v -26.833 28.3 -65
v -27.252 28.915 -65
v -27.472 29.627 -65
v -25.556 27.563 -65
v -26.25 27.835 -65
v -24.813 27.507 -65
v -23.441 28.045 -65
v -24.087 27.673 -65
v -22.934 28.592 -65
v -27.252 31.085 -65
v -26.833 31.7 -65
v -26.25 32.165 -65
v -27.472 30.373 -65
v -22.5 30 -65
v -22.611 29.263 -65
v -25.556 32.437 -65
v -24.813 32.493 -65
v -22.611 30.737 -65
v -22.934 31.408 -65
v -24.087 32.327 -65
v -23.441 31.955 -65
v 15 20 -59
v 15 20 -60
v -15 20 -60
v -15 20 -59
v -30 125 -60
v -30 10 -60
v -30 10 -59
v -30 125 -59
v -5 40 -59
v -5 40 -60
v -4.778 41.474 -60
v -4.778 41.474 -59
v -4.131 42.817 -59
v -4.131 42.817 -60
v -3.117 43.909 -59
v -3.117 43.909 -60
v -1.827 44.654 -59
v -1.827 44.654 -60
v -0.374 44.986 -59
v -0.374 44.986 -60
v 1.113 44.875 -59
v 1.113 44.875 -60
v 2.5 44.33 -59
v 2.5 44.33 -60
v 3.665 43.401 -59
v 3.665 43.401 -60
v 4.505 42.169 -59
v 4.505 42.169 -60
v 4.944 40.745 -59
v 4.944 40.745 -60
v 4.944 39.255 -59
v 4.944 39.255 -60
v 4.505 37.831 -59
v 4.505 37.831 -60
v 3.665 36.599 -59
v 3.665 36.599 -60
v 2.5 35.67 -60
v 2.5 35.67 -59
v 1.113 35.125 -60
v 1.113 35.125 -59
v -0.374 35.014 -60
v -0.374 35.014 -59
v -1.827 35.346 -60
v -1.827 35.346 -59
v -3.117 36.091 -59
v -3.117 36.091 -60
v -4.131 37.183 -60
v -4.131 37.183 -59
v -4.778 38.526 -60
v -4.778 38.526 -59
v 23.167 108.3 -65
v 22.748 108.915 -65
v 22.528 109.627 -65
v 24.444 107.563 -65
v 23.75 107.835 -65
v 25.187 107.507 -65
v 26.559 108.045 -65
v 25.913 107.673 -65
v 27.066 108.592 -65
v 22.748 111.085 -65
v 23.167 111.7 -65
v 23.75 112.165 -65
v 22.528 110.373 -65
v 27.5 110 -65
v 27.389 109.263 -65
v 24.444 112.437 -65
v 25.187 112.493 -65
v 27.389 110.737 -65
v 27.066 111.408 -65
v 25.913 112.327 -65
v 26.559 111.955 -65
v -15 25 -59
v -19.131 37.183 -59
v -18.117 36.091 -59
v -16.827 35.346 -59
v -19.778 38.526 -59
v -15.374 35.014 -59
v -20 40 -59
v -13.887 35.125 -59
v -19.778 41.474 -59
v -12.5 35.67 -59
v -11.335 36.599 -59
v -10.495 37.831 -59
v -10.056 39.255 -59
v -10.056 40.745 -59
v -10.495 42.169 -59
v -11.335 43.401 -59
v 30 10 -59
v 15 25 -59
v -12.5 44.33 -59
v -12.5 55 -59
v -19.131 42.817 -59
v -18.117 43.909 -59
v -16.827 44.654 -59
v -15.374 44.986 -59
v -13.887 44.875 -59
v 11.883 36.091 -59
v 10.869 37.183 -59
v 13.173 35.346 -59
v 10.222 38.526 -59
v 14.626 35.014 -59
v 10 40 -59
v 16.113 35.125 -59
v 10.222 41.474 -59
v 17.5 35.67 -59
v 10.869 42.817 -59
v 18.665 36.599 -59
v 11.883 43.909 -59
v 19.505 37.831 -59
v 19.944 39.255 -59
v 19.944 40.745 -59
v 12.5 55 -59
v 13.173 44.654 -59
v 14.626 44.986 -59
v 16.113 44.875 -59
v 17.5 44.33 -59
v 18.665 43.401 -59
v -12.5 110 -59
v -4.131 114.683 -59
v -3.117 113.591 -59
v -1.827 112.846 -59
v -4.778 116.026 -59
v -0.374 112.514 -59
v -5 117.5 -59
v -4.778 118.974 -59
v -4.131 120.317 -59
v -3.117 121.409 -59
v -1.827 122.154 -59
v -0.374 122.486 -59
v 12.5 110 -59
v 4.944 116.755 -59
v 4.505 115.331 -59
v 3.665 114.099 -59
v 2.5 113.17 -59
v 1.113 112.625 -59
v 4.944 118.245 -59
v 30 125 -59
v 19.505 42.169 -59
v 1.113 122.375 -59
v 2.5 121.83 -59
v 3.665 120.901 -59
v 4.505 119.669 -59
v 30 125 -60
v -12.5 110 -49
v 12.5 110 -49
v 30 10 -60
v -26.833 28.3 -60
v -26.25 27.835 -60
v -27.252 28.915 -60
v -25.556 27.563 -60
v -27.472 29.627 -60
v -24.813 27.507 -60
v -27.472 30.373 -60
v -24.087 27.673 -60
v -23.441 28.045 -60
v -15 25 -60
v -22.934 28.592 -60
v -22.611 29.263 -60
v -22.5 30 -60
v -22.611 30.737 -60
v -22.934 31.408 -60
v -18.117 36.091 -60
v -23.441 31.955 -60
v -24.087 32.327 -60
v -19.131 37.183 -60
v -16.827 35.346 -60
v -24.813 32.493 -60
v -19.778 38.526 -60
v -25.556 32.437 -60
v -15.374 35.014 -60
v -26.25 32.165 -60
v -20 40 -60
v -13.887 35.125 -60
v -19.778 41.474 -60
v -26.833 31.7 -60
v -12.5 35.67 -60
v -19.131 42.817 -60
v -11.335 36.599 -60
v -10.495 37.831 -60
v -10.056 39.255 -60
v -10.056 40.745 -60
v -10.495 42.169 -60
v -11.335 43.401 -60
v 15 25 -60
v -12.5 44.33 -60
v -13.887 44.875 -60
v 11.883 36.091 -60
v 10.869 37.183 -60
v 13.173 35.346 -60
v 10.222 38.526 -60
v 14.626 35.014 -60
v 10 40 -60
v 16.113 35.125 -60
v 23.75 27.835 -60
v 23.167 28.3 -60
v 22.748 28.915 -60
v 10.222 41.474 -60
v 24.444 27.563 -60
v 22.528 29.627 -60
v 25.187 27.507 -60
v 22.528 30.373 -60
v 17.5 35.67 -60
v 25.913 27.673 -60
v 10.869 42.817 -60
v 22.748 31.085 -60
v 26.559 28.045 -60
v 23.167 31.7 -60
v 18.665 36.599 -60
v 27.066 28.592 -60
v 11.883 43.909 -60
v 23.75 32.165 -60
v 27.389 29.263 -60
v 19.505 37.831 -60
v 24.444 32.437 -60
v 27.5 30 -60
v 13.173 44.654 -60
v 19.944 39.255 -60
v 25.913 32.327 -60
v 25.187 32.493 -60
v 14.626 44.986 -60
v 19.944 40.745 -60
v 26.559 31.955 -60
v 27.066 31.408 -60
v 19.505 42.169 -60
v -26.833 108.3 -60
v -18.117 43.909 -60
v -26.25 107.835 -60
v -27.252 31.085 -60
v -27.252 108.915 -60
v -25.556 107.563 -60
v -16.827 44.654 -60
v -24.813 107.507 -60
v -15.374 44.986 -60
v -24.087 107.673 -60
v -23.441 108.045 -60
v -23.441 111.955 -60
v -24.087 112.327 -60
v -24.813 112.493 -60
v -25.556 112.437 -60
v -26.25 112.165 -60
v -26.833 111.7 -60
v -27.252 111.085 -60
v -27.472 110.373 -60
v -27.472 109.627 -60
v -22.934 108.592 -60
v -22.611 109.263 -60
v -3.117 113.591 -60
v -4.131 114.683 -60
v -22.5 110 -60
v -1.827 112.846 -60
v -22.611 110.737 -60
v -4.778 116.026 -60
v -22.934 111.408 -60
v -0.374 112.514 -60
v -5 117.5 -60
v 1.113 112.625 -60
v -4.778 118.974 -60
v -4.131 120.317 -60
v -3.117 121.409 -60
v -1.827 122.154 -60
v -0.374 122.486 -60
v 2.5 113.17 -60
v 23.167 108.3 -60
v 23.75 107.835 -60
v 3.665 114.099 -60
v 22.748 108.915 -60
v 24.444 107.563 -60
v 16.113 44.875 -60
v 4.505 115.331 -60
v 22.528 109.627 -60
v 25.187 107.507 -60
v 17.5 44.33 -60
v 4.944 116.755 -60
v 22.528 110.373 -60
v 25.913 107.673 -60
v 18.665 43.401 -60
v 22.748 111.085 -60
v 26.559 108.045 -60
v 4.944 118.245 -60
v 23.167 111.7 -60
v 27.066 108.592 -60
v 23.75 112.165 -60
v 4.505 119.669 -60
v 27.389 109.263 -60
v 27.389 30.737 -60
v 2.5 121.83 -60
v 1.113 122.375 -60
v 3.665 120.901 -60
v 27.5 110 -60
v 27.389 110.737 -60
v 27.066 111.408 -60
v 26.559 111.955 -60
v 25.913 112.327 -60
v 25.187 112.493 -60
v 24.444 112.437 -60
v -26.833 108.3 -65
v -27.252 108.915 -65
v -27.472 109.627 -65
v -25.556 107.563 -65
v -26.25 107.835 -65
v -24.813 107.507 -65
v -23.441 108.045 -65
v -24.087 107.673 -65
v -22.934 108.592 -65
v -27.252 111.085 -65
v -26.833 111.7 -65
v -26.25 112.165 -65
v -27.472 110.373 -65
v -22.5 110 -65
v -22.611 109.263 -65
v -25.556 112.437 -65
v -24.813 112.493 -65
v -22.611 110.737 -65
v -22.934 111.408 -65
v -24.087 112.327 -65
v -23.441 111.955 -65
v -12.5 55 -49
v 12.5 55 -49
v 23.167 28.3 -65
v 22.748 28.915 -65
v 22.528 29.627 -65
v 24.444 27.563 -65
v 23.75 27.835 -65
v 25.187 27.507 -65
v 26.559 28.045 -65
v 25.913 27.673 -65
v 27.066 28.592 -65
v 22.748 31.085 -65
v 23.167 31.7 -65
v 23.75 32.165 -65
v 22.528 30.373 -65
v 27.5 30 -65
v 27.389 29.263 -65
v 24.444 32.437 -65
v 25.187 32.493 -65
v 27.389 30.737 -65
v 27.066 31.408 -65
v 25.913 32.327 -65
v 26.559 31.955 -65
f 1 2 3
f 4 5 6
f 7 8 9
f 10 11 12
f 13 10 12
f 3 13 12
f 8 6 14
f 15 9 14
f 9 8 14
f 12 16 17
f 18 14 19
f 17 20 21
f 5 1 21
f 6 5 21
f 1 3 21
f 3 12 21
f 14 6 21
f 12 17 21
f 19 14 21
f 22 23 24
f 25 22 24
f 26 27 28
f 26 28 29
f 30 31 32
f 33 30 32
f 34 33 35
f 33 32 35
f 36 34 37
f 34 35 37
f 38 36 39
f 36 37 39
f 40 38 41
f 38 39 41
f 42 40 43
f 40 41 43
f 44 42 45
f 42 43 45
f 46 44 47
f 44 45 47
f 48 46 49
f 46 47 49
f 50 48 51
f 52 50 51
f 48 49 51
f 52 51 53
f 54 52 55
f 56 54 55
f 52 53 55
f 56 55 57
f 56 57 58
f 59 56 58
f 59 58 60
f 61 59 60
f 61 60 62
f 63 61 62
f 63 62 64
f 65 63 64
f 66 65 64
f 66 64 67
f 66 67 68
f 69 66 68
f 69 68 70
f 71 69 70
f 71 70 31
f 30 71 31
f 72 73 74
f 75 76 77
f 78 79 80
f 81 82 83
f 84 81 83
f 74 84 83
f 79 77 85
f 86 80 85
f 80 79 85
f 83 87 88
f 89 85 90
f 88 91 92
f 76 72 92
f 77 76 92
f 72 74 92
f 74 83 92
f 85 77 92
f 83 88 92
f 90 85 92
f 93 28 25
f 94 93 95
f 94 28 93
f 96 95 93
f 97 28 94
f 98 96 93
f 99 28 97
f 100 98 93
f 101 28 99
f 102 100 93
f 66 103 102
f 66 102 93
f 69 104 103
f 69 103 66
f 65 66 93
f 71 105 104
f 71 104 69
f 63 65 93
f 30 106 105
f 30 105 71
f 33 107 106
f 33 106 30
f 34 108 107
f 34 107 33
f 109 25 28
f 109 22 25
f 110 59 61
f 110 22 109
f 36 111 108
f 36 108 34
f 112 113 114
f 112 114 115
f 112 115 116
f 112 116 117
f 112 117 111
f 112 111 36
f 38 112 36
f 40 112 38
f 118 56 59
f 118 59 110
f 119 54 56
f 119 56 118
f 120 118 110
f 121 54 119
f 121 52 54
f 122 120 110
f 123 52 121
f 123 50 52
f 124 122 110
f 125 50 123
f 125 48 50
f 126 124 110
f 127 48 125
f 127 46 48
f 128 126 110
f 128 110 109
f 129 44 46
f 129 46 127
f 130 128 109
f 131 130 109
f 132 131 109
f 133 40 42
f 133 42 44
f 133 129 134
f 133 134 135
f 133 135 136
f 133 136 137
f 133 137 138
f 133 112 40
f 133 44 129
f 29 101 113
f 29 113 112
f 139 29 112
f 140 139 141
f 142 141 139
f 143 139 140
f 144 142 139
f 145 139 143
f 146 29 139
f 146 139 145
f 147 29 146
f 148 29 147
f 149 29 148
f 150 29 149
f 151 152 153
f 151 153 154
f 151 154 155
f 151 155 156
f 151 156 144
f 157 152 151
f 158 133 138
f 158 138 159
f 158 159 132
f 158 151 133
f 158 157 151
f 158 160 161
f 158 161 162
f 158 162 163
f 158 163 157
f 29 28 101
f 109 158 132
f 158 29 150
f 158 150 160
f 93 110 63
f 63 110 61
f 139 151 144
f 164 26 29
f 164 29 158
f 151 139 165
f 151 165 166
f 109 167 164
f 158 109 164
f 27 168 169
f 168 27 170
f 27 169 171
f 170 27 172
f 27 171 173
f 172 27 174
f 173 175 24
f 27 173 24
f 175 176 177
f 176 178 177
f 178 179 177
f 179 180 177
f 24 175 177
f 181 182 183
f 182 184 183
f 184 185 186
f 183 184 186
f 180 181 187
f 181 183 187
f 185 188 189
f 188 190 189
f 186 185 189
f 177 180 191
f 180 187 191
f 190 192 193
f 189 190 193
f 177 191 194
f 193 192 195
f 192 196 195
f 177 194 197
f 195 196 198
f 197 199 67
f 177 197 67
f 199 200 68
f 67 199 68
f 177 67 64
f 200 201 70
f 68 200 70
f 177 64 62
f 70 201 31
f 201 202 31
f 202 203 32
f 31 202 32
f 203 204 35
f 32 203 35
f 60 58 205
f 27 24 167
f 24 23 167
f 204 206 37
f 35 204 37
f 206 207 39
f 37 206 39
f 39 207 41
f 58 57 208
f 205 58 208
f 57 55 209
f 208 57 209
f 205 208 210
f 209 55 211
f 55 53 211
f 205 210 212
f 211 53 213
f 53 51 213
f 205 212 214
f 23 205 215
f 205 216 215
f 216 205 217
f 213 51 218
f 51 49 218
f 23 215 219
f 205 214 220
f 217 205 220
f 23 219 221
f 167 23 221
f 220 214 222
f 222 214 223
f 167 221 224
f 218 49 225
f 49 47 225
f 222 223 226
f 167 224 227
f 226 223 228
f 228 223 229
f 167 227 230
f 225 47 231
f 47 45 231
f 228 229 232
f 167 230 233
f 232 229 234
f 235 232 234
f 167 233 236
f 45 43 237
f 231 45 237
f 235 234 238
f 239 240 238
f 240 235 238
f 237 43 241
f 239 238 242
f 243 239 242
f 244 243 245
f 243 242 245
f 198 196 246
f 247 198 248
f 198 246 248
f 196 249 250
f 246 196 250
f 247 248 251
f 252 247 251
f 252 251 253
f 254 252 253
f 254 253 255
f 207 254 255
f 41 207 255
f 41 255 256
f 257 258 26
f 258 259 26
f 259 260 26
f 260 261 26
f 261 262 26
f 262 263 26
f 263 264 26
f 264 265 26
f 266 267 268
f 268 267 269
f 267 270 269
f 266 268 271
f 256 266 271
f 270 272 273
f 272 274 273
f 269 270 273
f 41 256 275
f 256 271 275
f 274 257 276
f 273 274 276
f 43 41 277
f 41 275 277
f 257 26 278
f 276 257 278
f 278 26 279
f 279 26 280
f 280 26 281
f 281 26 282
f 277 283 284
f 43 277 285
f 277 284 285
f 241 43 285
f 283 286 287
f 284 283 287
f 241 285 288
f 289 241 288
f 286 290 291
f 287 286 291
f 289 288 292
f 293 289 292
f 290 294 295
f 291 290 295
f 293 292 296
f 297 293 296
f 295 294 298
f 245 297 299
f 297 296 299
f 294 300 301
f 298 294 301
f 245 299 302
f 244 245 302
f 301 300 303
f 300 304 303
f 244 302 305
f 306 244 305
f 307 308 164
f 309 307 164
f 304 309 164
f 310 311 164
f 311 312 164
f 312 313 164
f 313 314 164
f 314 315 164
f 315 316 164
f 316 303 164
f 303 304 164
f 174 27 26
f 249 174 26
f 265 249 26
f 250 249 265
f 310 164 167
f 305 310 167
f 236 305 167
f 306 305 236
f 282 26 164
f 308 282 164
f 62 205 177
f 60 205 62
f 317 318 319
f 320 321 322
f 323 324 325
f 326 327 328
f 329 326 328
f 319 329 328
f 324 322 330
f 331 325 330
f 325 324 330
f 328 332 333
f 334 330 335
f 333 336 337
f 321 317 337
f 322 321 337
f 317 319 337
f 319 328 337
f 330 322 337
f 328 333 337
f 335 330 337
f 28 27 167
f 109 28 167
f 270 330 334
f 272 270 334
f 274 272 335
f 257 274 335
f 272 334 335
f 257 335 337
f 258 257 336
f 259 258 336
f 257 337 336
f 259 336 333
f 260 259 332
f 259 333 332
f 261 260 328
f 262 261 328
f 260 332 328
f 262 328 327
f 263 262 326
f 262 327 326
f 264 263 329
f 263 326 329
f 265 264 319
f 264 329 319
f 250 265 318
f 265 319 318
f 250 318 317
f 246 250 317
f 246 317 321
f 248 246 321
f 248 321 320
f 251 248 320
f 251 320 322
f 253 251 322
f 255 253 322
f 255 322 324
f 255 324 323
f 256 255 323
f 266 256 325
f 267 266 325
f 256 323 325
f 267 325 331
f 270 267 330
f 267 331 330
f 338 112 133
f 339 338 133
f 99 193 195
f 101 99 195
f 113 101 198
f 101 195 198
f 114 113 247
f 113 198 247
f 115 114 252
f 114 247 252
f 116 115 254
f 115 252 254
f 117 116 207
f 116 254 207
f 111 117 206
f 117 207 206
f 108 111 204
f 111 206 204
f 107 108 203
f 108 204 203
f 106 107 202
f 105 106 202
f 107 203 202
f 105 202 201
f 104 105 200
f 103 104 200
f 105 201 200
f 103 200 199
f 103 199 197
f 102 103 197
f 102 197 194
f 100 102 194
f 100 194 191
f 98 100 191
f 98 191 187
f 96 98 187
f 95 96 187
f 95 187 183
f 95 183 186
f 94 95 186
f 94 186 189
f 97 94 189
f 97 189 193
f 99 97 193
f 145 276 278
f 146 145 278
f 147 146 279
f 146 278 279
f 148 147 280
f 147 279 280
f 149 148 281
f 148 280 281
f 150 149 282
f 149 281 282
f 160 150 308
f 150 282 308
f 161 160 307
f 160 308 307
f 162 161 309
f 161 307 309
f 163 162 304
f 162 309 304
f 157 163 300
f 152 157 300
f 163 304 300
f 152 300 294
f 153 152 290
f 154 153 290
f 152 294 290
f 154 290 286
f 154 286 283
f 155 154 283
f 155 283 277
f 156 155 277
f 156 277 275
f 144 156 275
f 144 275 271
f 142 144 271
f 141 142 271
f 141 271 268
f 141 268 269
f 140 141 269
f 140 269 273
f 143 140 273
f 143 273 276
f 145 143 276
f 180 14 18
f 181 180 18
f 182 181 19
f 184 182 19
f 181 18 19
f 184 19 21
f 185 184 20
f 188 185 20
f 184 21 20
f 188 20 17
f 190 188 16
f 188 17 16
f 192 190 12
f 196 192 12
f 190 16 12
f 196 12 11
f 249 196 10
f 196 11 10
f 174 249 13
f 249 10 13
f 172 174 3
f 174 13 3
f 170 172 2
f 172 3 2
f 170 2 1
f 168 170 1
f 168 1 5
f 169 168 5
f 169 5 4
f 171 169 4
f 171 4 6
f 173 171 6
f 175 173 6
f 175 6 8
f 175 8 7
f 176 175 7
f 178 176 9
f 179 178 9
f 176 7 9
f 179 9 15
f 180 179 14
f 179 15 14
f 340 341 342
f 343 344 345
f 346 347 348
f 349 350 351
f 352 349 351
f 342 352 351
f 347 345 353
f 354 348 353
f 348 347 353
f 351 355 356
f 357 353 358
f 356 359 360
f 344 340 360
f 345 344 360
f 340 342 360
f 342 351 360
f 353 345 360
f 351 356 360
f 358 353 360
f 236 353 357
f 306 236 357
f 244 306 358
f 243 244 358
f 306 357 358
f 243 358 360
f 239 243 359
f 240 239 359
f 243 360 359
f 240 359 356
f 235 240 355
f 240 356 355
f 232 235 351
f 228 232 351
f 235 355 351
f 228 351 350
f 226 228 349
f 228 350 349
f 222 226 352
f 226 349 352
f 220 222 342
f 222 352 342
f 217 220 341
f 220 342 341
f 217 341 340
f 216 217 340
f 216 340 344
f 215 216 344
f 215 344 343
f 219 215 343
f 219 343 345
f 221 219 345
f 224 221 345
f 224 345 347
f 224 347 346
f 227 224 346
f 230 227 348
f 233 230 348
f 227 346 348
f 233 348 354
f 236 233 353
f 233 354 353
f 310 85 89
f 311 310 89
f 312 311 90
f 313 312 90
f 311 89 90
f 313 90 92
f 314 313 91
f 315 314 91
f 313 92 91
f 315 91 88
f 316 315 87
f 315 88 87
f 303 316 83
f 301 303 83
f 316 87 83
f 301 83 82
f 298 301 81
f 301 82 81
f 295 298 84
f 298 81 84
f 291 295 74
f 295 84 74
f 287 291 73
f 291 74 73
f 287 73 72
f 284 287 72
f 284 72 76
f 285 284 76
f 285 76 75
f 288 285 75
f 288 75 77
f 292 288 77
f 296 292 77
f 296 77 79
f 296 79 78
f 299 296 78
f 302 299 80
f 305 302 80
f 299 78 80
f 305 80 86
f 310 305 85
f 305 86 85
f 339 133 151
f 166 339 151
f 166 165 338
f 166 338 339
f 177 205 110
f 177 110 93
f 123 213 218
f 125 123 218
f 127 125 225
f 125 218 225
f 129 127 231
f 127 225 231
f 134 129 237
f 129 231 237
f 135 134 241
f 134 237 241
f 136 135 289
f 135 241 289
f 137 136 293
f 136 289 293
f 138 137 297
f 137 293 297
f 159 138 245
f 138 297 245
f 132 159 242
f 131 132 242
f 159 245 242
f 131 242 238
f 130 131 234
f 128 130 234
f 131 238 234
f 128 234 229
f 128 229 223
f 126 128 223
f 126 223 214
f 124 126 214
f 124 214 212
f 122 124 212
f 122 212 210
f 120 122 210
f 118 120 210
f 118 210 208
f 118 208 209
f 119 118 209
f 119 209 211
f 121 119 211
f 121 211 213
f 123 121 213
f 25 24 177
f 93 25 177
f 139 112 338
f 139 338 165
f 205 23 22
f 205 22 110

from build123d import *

# Parameters (mm, degrees)
SKETCH1_R                       = 2.5
POSTS_DEPTH                     = 5
POSTS_2_DEPTH                   = 5
POSTS_3_DEPTH                   = 5
POSTS_4_DEPTH                   = 5
SKETCH2_W                       = 60
SKETCH2_H                       = 115
ELECTRONICS_CIRCUIT_BOARD_DEPTH = 1
SKETCH3_R                       = 5
SKETCH3_W                       = 30
SKETCH3_H                       = 5
MOTOR_LEADS_DEPTH               = 129.646803303
SKETCH4_W                       = 25
SKETCH4_H                       = 55
ESC_DEPTH                       = 10


with BuildPart() as part:
    # Sketch1 → Posts (new body)
    with BuildSketch(Plane.XY.offset(-65)):
        with Locations((-25, 110)):
            Circle(SKETCH1_R)
    extrude(amount=POSTS_DEPTH)



with BuildPart() as body_2:
    # Sketch1 → Posts 2 (new body)
    with BuildSketch(Plane.XY.offset(-65)):
        with Locations((25, 110)):
            Circle(SKETCH1_R)
    extrude(amount=POSTS_2_DEPTH)


with BuildPart() as body_3:
    # Sketch1 → Posts 3 (new body)
    with BuildSketch(Plane.XY.offset(-65)):
        with Locations((25, 30)):
            Circle(SKETCH1_R)
    extrude(amount=POSTS_3_DEPTH)


with BuildPart() as body_4:
    # Sketch1 → Posts 4 (new body)
    with BuildSketch(Plane.XY.offset(-65)):
        with Locations((-25, 30)):
            Circle(SKETCH1_R)
    extrude(amount=POSTS_4_DEPTH)


with BuildPart() as part_1:
    add(part.part)

    add(body_2.part)  # Electronics Circuit Board merges body 2

    add(body_3.part)  # Electronics Circuit Board merges body 3

    add(body_4.part)  # Electronics Circuit Board merges body 4
    # Sketch2 → Electronics Circuit Board (add)
    with BuildSketch(Plane.XY.offset(-60)):
        with Locations((0, 67.5)):
            Rectangle(SKETCH2_W, SKETCH2_H)
    extrude(amount=ELECTRONICS_CIRCUIT_BOARD_DEPTH)

    # Sketch3 → Motor Leads (cut, through all)
    with BuildSketch(Plane(origin=(0, 0, -60), x_dir=(-1, 0, 0), z_dir=(0, 0, -1))):
        with Locations((0, 40)):
            Circle(SKETCH3_R)
        with Locations((-15, 40)):
            Circle(SKETCH3_R)
        with Locations((15, 40)):
            Circle(SKETCH3_R)
        with Locations((0, 117.5)):
            Circle(SKETCH3_R)
        with Locations((0, 22.5)):
            Rectangle(SKETCH3_W, SKETCH3_H)
    extrude(amount=-MOTOR_LEADS_DEPTH, mode=Mode.SUBTRACT)

    # Sketch4 → ESC (add)
    with BuildSketch(Plane.XY.offset(-59)):
        with Locations((0, 82.5)):
            Rectangle(SKETCH4_W, SKETCH4_H)
    extrude(amount=ESC_DEPTH)


solid = part_1.part
